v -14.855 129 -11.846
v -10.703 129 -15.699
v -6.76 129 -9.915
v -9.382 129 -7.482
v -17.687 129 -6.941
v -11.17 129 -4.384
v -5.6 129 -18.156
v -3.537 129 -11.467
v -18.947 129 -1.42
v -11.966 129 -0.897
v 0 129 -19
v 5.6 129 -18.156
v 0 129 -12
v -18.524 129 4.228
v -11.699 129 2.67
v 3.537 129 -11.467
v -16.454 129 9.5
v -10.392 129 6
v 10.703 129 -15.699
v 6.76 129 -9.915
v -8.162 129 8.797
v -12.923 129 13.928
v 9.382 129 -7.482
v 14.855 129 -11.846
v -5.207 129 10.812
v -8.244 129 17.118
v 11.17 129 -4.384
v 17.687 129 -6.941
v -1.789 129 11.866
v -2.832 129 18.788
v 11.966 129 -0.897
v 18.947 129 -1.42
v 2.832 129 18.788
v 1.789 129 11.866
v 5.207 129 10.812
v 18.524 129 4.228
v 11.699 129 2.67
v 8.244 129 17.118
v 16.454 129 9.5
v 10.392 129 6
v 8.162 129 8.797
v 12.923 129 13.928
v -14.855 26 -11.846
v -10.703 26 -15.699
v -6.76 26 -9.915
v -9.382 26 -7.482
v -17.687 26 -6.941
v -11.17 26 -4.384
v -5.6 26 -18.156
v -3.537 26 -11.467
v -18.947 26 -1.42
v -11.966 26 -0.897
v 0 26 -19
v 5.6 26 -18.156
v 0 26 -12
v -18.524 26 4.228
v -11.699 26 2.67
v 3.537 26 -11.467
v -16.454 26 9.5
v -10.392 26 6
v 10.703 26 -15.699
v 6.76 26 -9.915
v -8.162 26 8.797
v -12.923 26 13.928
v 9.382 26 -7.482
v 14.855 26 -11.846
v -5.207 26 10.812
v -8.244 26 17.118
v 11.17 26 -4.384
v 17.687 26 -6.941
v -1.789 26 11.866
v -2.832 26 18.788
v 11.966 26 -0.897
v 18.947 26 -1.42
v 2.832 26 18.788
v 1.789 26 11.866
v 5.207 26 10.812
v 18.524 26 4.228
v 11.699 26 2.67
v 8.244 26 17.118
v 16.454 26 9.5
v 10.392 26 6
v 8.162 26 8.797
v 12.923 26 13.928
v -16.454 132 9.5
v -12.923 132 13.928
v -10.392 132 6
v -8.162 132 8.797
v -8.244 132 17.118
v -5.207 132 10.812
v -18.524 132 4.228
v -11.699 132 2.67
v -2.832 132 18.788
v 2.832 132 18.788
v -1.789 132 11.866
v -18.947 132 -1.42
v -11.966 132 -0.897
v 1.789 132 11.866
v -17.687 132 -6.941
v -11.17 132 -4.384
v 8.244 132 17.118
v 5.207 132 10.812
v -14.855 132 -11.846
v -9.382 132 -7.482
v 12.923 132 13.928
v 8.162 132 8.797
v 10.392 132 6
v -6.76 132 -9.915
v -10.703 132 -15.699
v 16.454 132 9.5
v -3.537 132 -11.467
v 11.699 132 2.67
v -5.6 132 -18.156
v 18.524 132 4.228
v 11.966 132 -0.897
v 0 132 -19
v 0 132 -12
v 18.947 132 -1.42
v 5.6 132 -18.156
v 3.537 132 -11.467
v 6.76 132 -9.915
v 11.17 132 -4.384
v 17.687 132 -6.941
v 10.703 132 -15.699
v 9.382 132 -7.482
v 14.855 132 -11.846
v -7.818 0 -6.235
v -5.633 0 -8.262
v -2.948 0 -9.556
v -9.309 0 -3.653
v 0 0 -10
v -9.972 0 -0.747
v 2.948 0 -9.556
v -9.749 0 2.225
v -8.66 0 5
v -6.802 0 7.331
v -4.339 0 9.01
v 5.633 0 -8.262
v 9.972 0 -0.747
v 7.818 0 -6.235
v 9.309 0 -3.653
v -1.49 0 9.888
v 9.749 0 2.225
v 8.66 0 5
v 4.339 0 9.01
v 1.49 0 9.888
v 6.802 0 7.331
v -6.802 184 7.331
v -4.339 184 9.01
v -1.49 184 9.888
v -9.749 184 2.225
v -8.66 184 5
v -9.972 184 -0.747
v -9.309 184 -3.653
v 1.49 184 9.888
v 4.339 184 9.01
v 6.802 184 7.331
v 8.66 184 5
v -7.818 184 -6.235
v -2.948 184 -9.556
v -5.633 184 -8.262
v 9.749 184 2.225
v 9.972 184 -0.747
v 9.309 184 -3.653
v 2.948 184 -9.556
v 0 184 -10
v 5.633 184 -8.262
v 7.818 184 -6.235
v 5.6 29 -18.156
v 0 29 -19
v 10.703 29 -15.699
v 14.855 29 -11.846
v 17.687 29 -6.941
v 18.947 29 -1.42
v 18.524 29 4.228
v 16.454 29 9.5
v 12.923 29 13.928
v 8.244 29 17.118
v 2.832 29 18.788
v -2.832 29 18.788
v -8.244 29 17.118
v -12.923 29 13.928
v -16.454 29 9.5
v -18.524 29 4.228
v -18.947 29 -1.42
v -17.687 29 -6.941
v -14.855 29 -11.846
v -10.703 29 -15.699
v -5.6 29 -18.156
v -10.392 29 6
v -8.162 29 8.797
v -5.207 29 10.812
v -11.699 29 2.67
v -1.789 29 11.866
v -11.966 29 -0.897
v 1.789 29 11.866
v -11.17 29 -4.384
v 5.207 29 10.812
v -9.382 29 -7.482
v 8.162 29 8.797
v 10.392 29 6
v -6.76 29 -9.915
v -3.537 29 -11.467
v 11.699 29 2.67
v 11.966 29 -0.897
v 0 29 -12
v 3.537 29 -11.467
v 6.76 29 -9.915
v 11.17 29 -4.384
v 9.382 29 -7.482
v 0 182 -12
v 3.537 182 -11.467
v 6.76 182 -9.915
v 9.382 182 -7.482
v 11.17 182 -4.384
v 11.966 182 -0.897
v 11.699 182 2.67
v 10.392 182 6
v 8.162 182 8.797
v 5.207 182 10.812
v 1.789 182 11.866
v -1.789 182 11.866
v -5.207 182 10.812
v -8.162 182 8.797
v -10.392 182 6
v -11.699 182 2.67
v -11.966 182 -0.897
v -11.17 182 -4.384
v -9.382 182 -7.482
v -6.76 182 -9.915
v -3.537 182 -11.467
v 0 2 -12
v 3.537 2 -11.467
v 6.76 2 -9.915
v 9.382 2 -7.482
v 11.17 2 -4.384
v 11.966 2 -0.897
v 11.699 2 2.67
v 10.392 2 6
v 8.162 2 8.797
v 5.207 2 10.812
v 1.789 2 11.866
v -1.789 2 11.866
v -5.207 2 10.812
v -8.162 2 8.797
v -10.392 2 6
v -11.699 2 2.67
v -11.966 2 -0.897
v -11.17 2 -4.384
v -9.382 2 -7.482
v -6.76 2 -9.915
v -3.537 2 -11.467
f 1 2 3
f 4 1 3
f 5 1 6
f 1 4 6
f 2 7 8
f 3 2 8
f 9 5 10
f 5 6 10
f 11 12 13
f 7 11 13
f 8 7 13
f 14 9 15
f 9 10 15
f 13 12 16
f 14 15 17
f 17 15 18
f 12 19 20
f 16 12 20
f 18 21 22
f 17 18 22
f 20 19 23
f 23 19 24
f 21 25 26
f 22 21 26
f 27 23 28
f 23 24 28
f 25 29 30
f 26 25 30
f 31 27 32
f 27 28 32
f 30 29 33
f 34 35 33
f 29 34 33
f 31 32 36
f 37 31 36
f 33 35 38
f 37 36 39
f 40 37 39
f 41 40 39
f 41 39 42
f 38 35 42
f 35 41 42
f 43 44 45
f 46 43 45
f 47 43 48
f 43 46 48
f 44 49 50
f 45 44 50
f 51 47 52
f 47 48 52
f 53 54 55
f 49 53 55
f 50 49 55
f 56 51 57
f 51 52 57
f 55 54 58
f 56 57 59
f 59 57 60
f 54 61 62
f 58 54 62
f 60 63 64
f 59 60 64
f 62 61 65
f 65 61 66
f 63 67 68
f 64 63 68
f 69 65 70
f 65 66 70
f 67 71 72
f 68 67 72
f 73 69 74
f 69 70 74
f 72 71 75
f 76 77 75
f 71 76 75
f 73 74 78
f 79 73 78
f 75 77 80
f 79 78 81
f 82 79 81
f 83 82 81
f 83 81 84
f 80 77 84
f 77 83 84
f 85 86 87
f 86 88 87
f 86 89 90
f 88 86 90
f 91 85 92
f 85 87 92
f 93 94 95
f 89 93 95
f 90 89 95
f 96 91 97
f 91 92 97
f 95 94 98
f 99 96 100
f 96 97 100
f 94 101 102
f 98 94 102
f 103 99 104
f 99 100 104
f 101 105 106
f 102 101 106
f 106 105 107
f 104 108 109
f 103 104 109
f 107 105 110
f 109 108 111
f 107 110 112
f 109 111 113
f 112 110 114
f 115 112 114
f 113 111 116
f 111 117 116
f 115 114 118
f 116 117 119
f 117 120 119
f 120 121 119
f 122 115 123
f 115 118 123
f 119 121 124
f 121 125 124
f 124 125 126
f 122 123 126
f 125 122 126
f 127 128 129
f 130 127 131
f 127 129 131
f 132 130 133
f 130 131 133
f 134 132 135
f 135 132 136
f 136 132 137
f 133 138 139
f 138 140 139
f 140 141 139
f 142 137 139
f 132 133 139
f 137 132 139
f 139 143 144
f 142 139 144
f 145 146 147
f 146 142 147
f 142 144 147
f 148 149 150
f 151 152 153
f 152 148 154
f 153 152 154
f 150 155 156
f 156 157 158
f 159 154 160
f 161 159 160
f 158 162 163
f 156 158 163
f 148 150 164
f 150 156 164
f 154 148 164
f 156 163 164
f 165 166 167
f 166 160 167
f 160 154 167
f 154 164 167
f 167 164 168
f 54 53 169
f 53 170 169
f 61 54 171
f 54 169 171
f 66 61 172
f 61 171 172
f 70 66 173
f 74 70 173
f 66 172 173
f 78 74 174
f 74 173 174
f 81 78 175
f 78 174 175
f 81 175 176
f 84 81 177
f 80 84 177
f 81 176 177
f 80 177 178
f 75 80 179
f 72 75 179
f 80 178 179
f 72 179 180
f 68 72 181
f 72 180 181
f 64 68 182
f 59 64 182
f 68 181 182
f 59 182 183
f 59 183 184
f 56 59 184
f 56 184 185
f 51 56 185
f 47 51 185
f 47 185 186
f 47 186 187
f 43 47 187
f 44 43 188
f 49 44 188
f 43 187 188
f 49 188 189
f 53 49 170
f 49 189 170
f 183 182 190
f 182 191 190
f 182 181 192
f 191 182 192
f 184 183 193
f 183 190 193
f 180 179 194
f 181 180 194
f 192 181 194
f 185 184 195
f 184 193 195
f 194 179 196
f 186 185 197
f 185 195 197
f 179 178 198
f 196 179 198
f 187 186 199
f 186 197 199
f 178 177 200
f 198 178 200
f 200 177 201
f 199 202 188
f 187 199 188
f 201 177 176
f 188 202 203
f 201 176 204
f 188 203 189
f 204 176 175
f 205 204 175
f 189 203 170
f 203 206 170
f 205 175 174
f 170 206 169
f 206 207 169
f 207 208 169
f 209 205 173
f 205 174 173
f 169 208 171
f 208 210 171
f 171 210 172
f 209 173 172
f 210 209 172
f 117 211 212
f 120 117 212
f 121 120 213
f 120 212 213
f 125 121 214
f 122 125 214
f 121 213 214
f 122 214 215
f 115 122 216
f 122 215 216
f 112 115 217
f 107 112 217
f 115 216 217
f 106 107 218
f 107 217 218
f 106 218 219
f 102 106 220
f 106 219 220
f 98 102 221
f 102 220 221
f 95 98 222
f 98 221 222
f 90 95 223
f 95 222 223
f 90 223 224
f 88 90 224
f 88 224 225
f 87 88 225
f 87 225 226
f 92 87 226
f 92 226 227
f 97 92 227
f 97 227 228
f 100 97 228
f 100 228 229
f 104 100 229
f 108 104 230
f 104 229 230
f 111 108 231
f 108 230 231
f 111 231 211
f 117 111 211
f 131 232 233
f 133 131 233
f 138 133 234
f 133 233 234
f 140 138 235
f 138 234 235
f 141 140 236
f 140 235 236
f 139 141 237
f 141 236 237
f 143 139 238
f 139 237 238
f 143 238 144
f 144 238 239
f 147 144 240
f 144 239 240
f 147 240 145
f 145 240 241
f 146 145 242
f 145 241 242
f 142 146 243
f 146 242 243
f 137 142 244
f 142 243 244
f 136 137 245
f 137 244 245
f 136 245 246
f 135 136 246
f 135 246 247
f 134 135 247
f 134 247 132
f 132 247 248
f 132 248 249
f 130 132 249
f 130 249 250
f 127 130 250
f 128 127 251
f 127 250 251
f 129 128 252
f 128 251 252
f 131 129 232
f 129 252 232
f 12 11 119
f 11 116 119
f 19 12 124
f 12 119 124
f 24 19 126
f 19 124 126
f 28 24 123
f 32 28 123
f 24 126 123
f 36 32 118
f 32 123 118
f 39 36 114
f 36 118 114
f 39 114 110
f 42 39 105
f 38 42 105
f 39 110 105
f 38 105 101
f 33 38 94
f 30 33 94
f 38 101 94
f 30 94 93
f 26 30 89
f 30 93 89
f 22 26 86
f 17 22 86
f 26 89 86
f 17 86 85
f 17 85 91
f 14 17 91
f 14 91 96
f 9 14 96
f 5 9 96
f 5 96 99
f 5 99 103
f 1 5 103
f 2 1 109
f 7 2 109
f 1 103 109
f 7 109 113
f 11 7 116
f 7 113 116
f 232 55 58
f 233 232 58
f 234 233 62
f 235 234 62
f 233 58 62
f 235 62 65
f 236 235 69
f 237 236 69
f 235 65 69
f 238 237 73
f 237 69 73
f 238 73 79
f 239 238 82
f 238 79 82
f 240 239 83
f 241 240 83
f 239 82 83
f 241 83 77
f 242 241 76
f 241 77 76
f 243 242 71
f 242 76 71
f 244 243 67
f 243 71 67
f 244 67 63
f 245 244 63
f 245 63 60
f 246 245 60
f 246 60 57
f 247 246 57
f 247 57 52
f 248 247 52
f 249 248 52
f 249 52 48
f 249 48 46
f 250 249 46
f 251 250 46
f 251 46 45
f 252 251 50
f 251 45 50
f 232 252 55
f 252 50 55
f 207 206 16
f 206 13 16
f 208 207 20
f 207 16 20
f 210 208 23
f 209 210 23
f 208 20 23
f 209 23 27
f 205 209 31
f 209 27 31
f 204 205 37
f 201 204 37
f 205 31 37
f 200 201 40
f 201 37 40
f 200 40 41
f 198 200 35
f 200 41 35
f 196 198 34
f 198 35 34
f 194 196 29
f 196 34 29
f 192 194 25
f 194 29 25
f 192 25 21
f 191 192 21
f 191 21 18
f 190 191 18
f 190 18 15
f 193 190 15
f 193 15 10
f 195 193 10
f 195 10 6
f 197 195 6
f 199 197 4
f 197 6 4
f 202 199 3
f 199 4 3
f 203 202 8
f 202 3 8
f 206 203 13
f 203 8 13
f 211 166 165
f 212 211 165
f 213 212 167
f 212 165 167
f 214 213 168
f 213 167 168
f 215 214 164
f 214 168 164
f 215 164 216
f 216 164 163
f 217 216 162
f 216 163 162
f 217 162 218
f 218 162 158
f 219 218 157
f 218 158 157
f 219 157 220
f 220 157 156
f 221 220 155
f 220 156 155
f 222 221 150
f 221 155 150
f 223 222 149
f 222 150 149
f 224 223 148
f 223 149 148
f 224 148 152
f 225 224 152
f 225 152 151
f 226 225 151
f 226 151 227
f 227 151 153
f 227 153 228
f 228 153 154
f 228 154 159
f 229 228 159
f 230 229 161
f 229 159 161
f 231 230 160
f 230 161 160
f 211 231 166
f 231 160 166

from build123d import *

# Parameters (mm, degrees)
CHAMFER3_SIZE = 2


with BuildPart() as part:
    # Sketch1 → Revolve1 (revolve)
    with BuildSketch(Plane(origin=(0, 0, 0), x_dir=(0, 0, -1), z_dir=(1, 0, 0))):
        Polygon((0, 0), (12, 0), (12, 26), (19, 26), (19, 29), (12, 29), (12, 129), (19, 129), (19, 132), (12, 132), (12, 184), (0, 184), align=None)
    revolve(axis=Axis((0, 184, 0), (0, -1, 0)))

    # Chamfer3
    chamfer3_edges = [part.edges().sort_by_distance(p)[0] for p in [
        (0, 0, 12),
        (0, 184, 12),
    ]]
    chamfer(chamfer3_edges, length=CHAMFER3_SIZE)


solid = part.part
